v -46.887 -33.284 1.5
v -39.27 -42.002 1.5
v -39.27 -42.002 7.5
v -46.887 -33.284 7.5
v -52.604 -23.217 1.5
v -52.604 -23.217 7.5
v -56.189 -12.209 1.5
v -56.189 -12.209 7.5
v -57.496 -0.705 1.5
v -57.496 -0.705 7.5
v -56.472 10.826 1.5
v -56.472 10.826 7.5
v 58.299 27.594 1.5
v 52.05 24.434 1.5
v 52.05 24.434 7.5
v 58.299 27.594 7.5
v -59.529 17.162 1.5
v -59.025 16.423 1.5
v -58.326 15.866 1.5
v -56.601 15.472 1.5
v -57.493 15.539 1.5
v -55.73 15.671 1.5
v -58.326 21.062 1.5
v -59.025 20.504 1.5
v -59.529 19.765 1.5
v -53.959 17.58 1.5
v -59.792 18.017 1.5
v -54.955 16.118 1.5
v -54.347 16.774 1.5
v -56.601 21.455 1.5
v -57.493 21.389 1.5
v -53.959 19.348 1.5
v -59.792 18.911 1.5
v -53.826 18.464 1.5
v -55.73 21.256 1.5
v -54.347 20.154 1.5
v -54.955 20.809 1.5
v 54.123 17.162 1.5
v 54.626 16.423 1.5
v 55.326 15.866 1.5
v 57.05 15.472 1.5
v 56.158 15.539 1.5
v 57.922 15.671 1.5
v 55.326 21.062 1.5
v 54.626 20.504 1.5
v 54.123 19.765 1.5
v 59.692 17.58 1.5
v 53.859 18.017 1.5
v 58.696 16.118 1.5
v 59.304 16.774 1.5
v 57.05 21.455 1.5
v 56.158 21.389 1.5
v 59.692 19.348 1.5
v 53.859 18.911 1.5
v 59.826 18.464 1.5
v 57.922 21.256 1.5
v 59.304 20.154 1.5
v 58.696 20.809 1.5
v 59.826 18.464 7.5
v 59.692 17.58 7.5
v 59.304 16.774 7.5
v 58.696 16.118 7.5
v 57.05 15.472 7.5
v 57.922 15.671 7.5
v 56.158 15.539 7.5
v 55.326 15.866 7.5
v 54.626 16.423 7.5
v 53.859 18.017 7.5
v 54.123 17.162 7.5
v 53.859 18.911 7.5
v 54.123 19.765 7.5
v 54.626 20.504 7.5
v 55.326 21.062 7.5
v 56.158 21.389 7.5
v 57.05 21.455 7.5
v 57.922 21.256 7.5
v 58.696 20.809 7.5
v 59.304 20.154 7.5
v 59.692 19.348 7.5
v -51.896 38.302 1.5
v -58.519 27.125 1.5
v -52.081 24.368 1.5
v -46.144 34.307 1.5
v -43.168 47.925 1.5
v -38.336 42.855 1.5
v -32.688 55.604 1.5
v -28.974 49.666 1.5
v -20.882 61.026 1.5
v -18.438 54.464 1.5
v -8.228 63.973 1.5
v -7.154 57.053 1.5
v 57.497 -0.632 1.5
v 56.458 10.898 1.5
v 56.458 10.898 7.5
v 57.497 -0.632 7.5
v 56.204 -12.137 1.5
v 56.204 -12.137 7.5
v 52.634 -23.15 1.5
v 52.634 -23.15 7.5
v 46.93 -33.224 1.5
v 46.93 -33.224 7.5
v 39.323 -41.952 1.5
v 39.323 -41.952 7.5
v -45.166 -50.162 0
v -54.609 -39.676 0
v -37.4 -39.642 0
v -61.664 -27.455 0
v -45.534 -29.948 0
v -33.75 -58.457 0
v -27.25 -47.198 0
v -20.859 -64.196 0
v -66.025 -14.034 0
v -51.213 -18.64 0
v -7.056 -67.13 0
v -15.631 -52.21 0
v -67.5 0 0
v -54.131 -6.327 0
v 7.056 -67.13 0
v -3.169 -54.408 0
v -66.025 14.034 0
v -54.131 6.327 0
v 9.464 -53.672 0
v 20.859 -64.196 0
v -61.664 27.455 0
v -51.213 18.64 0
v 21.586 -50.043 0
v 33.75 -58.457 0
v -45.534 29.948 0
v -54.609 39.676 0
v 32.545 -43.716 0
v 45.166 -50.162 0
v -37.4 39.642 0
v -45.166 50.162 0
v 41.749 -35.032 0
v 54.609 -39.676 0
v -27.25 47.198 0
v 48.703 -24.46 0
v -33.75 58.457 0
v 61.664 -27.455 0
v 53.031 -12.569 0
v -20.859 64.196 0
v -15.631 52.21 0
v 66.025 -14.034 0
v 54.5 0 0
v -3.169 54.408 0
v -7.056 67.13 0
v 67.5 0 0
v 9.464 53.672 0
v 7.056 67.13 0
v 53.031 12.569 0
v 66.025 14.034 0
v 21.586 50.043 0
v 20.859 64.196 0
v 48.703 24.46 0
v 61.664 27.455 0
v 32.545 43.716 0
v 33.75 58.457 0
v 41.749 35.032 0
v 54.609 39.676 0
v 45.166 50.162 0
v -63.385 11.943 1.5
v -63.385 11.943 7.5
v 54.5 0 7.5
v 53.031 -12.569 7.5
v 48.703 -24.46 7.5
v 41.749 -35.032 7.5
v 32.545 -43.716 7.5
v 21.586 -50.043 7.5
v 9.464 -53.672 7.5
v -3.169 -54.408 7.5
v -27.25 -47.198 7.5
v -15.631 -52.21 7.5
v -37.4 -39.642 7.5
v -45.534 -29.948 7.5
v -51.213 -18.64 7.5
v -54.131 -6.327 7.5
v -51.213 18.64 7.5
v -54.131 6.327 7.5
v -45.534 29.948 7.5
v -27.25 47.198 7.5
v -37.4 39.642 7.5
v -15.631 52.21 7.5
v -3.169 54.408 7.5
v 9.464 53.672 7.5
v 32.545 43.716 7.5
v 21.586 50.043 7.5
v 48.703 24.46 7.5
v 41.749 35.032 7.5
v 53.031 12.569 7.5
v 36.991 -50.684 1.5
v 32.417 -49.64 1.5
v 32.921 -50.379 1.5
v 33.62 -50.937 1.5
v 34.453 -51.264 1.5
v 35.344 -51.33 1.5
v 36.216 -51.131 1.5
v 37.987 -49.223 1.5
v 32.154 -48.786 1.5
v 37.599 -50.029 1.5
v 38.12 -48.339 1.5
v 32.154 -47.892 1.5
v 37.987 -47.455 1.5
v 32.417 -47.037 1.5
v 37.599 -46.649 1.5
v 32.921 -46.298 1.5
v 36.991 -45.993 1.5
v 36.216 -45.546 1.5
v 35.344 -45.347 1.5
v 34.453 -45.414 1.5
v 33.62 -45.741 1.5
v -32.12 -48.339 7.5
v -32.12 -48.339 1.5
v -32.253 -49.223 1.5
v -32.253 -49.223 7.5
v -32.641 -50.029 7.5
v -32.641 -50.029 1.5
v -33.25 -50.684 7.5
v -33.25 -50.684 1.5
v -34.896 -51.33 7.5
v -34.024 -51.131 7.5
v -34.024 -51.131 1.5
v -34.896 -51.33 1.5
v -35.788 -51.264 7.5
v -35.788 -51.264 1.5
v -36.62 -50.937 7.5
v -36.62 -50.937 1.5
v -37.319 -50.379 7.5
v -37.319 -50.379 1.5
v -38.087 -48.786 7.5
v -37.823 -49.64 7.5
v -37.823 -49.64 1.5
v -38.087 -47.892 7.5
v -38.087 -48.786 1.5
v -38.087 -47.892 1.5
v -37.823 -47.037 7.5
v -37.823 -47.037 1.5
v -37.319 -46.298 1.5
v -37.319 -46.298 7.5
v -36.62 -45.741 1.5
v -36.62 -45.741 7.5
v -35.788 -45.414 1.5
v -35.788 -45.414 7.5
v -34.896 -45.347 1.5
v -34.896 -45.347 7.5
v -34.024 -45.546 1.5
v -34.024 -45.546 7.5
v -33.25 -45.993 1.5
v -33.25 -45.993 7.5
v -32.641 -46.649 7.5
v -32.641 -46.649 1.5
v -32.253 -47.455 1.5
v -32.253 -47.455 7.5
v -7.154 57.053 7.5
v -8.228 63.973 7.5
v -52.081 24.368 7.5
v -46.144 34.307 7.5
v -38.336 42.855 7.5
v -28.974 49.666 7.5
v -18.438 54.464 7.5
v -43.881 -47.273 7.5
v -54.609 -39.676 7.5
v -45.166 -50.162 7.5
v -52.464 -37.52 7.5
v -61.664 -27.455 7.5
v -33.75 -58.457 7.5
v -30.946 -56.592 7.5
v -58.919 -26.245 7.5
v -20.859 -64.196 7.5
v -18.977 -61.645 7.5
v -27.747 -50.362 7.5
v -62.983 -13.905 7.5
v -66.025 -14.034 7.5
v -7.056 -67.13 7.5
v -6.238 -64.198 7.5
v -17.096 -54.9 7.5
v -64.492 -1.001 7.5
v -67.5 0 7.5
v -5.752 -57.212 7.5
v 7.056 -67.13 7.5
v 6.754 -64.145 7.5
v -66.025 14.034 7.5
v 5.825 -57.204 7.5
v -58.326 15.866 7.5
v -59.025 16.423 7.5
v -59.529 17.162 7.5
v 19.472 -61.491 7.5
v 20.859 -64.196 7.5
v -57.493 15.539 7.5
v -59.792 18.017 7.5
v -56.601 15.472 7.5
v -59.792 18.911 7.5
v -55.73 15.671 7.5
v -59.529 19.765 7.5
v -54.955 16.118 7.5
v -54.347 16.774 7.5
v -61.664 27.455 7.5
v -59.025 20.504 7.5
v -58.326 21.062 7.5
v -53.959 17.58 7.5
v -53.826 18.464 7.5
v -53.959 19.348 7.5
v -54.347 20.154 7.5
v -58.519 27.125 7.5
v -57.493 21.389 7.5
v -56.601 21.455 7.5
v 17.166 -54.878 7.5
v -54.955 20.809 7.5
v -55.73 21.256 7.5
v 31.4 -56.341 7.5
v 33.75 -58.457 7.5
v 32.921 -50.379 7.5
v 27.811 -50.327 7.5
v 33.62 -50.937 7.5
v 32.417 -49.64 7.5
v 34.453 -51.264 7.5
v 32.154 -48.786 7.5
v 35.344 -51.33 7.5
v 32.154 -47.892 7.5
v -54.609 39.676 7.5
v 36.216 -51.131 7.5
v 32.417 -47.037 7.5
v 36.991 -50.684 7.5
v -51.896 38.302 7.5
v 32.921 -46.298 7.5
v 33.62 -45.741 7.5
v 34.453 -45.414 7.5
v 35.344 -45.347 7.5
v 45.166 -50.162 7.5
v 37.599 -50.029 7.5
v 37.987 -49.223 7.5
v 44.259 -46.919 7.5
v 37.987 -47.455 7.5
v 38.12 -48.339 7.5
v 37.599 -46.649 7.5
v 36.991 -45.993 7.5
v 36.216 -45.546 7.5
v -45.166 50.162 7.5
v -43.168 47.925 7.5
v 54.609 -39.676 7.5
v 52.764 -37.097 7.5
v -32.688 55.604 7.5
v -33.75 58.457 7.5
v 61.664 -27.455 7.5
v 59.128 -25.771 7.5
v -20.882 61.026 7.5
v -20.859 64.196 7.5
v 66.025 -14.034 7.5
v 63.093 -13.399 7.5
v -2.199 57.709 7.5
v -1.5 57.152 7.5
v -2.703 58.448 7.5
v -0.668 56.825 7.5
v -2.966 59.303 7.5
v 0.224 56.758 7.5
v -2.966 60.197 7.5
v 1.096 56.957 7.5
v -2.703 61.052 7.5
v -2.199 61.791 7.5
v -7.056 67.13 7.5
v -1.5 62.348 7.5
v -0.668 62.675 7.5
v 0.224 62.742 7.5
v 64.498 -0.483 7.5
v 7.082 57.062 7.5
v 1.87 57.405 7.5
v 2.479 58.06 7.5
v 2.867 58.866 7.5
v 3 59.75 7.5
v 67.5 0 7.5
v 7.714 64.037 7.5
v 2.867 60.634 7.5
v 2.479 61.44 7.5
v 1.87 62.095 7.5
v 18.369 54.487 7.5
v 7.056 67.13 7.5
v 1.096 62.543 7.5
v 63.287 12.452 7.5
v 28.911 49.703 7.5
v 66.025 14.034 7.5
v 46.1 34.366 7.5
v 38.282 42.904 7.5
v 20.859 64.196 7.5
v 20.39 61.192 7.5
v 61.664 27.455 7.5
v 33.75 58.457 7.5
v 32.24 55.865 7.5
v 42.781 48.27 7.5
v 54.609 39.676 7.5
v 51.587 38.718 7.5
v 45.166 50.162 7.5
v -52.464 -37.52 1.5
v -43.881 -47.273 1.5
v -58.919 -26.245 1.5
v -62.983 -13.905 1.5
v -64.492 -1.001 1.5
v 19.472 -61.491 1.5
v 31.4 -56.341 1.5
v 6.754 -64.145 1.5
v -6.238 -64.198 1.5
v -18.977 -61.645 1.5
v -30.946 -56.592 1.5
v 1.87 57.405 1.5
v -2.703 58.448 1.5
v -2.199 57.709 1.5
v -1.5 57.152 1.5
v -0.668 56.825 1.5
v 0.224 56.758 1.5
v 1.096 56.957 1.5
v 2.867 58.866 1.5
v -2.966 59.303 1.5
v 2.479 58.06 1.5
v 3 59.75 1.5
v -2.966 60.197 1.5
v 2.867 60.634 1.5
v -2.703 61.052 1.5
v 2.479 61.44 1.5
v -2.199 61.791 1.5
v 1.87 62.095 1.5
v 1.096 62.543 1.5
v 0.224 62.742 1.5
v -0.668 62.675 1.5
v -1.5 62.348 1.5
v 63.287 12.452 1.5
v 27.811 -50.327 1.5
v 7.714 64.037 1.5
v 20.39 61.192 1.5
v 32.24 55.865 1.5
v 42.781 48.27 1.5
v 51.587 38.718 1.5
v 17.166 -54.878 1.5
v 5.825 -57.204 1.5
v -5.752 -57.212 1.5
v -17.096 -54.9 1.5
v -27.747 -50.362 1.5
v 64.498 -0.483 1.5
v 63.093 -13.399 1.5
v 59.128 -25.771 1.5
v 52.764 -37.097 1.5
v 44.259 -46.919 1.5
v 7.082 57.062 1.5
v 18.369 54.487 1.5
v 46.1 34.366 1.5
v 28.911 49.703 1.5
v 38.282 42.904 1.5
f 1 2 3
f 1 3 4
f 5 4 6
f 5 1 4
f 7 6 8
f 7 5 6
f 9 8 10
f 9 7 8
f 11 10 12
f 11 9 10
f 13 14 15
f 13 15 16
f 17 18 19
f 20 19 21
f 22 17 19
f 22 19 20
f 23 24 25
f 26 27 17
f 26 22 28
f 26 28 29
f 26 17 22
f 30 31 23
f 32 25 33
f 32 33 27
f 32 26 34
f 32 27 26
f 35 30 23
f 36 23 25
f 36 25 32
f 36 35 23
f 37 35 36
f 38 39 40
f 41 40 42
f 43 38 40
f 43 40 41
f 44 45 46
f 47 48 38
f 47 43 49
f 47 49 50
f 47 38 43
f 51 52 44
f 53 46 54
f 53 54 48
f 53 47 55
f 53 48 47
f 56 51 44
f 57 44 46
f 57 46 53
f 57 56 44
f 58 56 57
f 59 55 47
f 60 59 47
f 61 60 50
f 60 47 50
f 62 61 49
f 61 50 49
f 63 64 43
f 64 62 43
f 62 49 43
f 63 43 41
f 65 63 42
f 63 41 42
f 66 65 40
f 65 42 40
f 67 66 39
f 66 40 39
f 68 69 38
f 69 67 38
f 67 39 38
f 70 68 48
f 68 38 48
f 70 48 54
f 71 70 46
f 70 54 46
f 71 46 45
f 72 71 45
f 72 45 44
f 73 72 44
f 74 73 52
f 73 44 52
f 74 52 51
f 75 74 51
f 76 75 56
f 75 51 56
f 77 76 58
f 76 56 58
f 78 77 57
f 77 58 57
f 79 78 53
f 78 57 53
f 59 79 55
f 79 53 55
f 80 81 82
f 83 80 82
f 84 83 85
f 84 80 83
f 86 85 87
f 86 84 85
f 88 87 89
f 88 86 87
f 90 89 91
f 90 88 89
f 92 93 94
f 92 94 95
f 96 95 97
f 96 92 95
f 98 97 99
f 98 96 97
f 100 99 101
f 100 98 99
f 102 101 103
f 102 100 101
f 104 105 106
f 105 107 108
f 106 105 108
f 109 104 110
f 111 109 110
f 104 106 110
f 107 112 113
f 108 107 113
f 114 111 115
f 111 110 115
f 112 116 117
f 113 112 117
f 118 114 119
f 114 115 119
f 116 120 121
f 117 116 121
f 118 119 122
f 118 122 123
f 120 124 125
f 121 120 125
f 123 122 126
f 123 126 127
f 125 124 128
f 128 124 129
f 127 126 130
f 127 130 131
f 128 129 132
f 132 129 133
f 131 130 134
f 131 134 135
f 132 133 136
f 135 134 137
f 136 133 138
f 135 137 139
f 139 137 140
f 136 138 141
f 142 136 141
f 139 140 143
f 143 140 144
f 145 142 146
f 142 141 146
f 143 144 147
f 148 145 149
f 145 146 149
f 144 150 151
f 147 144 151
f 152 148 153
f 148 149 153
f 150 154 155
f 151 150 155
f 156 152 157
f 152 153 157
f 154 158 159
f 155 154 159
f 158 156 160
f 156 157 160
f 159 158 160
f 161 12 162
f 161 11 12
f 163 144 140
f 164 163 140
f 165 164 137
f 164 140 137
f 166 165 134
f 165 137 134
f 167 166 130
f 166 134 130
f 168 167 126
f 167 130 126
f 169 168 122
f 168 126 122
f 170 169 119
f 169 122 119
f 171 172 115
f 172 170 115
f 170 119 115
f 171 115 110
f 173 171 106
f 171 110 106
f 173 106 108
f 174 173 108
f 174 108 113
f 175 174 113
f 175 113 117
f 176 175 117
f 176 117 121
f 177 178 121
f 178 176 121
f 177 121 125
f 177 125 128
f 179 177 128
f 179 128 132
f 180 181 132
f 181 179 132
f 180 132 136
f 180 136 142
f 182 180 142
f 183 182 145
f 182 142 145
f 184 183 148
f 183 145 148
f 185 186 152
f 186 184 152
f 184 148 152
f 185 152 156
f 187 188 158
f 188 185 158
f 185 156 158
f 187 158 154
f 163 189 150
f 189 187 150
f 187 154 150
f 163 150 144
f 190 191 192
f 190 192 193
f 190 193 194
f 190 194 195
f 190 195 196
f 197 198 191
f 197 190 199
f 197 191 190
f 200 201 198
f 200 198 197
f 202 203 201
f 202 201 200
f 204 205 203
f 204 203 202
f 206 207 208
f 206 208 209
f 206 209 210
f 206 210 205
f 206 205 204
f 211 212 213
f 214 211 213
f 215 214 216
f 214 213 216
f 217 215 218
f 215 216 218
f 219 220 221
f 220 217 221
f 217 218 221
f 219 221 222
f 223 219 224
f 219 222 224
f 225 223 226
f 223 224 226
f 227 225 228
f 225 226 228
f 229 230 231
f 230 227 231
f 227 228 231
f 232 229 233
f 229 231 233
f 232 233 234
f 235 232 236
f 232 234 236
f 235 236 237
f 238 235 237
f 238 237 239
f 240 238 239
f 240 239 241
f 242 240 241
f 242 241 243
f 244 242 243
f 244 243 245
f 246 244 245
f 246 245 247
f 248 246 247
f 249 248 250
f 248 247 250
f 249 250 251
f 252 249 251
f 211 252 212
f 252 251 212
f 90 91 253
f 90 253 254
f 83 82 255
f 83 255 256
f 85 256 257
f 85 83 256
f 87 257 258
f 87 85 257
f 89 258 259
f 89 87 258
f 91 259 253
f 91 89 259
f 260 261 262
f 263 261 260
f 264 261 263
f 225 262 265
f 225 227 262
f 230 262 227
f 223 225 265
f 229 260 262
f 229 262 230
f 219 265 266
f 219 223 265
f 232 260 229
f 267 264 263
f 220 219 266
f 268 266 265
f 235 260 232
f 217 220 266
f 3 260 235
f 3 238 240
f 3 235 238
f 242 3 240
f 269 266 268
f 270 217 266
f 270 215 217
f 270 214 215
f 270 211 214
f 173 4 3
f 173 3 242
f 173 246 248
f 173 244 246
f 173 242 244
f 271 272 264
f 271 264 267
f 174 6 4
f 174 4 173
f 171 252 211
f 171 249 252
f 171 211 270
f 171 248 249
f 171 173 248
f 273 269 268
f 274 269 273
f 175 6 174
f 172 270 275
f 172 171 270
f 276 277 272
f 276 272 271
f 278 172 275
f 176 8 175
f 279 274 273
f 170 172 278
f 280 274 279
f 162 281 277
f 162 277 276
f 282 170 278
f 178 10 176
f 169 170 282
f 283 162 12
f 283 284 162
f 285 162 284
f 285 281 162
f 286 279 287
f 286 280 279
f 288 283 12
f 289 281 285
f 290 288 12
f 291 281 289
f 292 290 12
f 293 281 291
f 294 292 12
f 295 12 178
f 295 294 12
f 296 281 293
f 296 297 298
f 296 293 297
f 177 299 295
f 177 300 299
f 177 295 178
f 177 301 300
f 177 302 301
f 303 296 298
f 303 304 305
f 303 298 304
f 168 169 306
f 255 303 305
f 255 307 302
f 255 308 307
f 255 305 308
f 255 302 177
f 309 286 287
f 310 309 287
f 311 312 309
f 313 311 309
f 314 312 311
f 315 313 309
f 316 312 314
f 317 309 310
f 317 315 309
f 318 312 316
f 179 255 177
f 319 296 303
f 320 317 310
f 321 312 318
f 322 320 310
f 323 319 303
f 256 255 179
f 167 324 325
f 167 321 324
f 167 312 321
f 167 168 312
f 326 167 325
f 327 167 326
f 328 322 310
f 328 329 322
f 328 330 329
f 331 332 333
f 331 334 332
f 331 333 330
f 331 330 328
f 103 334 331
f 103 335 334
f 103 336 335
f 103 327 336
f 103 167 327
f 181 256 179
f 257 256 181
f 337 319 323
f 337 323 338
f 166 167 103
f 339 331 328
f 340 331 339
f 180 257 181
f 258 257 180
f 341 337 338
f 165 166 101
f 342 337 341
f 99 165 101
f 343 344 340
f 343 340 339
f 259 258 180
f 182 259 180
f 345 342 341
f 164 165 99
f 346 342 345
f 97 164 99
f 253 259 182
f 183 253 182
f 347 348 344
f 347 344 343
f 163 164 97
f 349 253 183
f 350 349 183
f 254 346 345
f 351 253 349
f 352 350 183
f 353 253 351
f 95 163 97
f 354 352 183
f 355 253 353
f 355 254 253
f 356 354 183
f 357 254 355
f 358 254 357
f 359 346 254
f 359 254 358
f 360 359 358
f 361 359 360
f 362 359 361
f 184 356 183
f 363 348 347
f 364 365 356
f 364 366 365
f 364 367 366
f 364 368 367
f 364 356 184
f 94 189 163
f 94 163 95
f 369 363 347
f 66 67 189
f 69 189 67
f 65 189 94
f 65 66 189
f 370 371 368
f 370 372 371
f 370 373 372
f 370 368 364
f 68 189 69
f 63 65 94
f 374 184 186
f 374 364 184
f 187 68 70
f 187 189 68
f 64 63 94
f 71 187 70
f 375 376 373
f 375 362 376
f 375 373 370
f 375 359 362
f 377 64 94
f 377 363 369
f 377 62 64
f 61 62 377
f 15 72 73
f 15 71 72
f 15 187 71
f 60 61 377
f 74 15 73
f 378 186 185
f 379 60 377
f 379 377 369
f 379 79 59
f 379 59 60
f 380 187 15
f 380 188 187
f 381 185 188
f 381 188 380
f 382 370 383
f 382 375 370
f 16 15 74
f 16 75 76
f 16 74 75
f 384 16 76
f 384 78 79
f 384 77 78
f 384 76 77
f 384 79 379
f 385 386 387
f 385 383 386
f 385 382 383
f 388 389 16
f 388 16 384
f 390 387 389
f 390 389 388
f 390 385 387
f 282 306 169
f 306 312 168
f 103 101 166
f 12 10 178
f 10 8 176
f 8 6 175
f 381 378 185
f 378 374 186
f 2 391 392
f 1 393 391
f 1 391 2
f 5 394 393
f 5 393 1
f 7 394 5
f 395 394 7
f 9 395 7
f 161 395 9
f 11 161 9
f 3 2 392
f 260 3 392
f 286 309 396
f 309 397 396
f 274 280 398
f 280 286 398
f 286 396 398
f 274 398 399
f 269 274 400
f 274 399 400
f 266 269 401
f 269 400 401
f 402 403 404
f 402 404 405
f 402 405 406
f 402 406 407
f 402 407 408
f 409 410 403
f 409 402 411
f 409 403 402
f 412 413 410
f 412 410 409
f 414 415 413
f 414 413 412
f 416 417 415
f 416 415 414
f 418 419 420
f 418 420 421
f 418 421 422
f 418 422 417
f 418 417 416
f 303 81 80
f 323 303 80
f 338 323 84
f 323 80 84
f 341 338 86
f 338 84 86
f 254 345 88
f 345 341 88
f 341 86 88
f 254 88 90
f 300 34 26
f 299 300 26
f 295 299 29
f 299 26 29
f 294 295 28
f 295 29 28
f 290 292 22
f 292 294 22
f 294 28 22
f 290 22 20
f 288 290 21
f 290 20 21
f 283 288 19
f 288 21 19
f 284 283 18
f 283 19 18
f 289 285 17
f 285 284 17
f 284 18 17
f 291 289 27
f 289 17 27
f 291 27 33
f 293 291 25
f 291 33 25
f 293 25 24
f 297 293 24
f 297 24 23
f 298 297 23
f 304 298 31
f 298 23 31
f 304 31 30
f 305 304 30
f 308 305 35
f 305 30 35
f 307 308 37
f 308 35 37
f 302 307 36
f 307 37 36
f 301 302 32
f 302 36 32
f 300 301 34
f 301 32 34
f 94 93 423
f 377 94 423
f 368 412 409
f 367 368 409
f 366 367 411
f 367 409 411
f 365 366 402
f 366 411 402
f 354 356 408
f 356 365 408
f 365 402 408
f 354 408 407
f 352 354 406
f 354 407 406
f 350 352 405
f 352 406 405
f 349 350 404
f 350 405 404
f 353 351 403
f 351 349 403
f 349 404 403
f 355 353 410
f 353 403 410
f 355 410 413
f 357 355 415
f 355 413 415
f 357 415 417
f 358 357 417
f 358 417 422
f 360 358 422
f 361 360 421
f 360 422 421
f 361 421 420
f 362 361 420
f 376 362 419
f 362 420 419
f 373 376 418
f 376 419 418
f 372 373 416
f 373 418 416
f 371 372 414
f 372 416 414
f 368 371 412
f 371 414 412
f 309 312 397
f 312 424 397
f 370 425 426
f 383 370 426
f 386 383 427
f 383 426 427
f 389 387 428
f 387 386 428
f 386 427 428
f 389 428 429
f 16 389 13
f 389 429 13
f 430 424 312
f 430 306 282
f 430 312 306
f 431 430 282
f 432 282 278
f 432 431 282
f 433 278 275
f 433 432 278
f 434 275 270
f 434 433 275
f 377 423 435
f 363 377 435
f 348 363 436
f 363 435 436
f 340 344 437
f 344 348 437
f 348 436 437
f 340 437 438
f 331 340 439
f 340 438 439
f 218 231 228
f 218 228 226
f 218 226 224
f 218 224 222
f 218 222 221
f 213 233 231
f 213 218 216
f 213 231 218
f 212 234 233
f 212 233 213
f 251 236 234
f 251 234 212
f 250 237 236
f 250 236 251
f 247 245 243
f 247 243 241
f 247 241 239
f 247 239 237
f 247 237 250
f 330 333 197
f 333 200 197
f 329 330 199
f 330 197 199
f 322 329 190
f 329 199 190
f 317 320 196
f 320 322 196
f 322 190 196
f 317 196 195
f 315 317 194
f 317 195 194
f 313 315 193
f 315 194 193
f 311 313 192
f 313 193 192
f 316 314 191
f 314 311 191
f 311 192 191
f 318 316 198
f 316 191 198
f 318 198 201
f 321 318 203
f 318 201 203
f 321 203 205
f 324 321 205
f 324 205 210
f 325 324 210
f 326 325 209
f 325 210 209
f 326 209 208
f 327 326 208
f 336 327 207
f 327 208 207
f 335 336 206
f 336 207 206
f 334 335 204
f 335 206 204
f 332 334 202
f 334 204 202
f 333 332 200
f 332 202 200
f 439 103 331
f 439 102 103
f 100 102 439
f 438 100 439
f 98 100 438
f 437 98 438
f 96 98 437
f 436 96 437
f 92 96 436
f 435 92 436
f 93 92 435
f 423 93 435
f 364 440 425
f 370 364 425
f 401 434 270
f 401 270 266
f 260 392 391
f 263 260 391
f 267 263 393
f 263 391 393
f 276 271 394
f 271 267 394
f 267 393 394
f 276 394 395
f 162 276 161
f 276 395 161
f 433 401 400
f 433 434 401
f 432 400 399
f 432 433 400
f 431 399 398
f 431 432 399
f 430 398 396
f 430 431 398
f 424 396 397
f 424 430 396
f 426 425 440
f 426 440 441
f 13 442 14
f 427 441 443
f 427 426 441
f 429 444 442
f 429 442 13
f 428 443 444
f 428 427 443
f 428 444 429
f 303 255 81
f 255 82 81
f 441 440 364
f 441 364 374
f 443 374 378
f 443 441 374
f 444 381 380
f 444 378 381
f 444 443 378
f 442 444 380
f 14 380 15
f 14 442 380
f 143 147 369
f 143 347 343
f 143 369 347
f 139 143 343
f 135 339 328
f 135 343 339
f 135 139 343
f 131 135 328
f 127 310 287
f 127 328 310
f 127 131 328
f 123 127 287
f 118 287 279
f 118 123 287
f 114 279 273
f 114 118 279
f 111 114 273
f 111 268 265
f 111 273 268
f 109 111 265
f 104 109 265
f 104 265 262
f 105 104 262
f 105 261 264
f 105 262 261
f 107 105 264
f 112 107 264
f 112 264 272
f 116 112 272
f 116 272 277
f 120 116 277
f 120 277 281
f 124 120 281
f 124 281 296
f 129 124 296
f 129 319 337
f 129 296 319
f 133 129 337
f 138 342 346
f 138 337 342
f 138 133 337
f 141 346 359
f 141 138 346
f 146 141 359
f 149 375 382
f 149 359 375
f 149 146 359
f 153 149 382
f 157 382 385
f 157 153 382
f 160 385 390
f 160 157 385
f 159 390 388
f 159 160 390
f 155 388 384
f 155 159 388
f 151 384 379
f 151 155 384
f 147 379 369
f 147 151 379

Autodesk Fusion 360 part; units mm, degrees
sketch "Sketch1" plane through (0, 0, 0) normal (0, 0, 1) x (1, 0, 0)
  circle A0 centre (0, 0) radius 54.5
  circle A1 centre (0, 0) radius 67.5
  line L0 (0, 0) -> (67.5, 0) construction
  line L1 (0, 0) -> (67.5, 0) construction
  line L2 (0, 56.25) -> (0, 63.25) construction
  circle A2 centre (0, 59.75) radius 3
  line L3 (-7.1543, 57.0532) -> (-8.2283, 63.973)
  line L4 (7.0818, 57.0622) -> (7.7138, 64.0371)
  line L5 (-56.4716, 10.8263) -> (-63.3846, 11.9432)
  circle A3 centre (-56.8256, 18.4638) radius 3
  line L6 (-52.081, 24.3683) -> (-58.5192, 27.1248)
  line L7 (-27.7471, -50.3622) -> (-30.9456, -56.5917)
  circle A4 centre (-35.1202, -48.3388) radius 3
  line L8 (-39.2696, -42.0018) -> (-43.8806, -47.273)
  line L9 (39.323, -41.9518) -> (44.2592, -46.9188)
  circle A5 centre (35.1202, -48.3388) radius 3
  line L10 (27.8111, -50.3269) -> (31.3995, -56.3411)
  line L11 (52.05, 24.4345) -> (58.2993, 27.5943)
  circle A6 centre (56.8256, 18.4638) radius 3
  line L12 (56.4578, 10.8981) -> (63.2866, 12.4523)
  arc A7 (52.05, 24.4345) -> (7.0818, 57.0622) centre (0, 0) ccw
  arc A8 (58.2993, 27.5943) -> (7.7138, 64.0371) centre (0, 0) ccw
  arc A9 (-7.1543, 57.0532) -> (-52.081, 24.3683) centre (0, 0) ccw
  arc A10 (-8.2283, 63.973) -> (-58.5192, 27.1248) centre (0, 0) ccw
  arc A11 (-56.4716, 10.8263) -> (-39.2696, -42.0018) centre (0, 0) ccw
  arc A12 (-63.3846, 11.9432) -> (-43.8806, -47.273) centre (0, 0) ccw
  arc A13 (-27.7471, -50.3622) -> (27.8111, -50.3269) centre (0, 0) ccw
  arc A14 (39.323, -41.9518) -> (56.4578, 10.8981) centre (0, 0) ccw
  arc A15 (-30.9456, -56.5917) -> (31.3995, -56.3411) centre (0, 0) ccw
  arc A16 (44.2592, -46.9188) -> (63.2866, 12.4523) centre (0, 0) ccw
  line L13 (0, 0) -> (0, 67.5) construction
  dimension "d1" = 109
  dimension "d2" = 135
  dimension "d3" = 115
  dimension "d4" = 129
  dimension "d7" = 6
  dimension "d8" = 7
  dimension "d10" = 360
  dimension "d11" = 59.75
  dimension "d12" = 14
  dimension "d14" = 7.2954
  dimension "d15" = 14.8681
extrude "Extrude1" add sketch "Sketch1" along normal blind 1.5 contours A2 | L3 L6 A9 A10 | L4 L11 A7 A8 | L5 L8 A11 A12 | A3 | L7 L10 A13 A15 | A4 | L9 L12 A14 A16 | A5 | A6 makes body 1 at (34.6202, -46.3461, 0) makes body 2 at (61.3877, 8.8614, 0) makes body 3 at (-54.8723, 28.9138, 0) makes body 4 at (-44.4551, -43.2519, 0) makes body 5 at (59.8219, 18.3142, 1) makes body 6 at (-53.8294, 18.3142, 1) makes body 7 at (27.3976, -55.6449, 0) makes body 8 at (10.5421, 61.1215, 0) makes body 9 at (-34.2393, -47.0468, 0) makes body 10 at (2.9963, 59.6005, 1)
extrude "Extrude2" add sketch "Sketch1" along normal blind 7.5 bodies 1 2 3 4 5 6 7 8 9 10
